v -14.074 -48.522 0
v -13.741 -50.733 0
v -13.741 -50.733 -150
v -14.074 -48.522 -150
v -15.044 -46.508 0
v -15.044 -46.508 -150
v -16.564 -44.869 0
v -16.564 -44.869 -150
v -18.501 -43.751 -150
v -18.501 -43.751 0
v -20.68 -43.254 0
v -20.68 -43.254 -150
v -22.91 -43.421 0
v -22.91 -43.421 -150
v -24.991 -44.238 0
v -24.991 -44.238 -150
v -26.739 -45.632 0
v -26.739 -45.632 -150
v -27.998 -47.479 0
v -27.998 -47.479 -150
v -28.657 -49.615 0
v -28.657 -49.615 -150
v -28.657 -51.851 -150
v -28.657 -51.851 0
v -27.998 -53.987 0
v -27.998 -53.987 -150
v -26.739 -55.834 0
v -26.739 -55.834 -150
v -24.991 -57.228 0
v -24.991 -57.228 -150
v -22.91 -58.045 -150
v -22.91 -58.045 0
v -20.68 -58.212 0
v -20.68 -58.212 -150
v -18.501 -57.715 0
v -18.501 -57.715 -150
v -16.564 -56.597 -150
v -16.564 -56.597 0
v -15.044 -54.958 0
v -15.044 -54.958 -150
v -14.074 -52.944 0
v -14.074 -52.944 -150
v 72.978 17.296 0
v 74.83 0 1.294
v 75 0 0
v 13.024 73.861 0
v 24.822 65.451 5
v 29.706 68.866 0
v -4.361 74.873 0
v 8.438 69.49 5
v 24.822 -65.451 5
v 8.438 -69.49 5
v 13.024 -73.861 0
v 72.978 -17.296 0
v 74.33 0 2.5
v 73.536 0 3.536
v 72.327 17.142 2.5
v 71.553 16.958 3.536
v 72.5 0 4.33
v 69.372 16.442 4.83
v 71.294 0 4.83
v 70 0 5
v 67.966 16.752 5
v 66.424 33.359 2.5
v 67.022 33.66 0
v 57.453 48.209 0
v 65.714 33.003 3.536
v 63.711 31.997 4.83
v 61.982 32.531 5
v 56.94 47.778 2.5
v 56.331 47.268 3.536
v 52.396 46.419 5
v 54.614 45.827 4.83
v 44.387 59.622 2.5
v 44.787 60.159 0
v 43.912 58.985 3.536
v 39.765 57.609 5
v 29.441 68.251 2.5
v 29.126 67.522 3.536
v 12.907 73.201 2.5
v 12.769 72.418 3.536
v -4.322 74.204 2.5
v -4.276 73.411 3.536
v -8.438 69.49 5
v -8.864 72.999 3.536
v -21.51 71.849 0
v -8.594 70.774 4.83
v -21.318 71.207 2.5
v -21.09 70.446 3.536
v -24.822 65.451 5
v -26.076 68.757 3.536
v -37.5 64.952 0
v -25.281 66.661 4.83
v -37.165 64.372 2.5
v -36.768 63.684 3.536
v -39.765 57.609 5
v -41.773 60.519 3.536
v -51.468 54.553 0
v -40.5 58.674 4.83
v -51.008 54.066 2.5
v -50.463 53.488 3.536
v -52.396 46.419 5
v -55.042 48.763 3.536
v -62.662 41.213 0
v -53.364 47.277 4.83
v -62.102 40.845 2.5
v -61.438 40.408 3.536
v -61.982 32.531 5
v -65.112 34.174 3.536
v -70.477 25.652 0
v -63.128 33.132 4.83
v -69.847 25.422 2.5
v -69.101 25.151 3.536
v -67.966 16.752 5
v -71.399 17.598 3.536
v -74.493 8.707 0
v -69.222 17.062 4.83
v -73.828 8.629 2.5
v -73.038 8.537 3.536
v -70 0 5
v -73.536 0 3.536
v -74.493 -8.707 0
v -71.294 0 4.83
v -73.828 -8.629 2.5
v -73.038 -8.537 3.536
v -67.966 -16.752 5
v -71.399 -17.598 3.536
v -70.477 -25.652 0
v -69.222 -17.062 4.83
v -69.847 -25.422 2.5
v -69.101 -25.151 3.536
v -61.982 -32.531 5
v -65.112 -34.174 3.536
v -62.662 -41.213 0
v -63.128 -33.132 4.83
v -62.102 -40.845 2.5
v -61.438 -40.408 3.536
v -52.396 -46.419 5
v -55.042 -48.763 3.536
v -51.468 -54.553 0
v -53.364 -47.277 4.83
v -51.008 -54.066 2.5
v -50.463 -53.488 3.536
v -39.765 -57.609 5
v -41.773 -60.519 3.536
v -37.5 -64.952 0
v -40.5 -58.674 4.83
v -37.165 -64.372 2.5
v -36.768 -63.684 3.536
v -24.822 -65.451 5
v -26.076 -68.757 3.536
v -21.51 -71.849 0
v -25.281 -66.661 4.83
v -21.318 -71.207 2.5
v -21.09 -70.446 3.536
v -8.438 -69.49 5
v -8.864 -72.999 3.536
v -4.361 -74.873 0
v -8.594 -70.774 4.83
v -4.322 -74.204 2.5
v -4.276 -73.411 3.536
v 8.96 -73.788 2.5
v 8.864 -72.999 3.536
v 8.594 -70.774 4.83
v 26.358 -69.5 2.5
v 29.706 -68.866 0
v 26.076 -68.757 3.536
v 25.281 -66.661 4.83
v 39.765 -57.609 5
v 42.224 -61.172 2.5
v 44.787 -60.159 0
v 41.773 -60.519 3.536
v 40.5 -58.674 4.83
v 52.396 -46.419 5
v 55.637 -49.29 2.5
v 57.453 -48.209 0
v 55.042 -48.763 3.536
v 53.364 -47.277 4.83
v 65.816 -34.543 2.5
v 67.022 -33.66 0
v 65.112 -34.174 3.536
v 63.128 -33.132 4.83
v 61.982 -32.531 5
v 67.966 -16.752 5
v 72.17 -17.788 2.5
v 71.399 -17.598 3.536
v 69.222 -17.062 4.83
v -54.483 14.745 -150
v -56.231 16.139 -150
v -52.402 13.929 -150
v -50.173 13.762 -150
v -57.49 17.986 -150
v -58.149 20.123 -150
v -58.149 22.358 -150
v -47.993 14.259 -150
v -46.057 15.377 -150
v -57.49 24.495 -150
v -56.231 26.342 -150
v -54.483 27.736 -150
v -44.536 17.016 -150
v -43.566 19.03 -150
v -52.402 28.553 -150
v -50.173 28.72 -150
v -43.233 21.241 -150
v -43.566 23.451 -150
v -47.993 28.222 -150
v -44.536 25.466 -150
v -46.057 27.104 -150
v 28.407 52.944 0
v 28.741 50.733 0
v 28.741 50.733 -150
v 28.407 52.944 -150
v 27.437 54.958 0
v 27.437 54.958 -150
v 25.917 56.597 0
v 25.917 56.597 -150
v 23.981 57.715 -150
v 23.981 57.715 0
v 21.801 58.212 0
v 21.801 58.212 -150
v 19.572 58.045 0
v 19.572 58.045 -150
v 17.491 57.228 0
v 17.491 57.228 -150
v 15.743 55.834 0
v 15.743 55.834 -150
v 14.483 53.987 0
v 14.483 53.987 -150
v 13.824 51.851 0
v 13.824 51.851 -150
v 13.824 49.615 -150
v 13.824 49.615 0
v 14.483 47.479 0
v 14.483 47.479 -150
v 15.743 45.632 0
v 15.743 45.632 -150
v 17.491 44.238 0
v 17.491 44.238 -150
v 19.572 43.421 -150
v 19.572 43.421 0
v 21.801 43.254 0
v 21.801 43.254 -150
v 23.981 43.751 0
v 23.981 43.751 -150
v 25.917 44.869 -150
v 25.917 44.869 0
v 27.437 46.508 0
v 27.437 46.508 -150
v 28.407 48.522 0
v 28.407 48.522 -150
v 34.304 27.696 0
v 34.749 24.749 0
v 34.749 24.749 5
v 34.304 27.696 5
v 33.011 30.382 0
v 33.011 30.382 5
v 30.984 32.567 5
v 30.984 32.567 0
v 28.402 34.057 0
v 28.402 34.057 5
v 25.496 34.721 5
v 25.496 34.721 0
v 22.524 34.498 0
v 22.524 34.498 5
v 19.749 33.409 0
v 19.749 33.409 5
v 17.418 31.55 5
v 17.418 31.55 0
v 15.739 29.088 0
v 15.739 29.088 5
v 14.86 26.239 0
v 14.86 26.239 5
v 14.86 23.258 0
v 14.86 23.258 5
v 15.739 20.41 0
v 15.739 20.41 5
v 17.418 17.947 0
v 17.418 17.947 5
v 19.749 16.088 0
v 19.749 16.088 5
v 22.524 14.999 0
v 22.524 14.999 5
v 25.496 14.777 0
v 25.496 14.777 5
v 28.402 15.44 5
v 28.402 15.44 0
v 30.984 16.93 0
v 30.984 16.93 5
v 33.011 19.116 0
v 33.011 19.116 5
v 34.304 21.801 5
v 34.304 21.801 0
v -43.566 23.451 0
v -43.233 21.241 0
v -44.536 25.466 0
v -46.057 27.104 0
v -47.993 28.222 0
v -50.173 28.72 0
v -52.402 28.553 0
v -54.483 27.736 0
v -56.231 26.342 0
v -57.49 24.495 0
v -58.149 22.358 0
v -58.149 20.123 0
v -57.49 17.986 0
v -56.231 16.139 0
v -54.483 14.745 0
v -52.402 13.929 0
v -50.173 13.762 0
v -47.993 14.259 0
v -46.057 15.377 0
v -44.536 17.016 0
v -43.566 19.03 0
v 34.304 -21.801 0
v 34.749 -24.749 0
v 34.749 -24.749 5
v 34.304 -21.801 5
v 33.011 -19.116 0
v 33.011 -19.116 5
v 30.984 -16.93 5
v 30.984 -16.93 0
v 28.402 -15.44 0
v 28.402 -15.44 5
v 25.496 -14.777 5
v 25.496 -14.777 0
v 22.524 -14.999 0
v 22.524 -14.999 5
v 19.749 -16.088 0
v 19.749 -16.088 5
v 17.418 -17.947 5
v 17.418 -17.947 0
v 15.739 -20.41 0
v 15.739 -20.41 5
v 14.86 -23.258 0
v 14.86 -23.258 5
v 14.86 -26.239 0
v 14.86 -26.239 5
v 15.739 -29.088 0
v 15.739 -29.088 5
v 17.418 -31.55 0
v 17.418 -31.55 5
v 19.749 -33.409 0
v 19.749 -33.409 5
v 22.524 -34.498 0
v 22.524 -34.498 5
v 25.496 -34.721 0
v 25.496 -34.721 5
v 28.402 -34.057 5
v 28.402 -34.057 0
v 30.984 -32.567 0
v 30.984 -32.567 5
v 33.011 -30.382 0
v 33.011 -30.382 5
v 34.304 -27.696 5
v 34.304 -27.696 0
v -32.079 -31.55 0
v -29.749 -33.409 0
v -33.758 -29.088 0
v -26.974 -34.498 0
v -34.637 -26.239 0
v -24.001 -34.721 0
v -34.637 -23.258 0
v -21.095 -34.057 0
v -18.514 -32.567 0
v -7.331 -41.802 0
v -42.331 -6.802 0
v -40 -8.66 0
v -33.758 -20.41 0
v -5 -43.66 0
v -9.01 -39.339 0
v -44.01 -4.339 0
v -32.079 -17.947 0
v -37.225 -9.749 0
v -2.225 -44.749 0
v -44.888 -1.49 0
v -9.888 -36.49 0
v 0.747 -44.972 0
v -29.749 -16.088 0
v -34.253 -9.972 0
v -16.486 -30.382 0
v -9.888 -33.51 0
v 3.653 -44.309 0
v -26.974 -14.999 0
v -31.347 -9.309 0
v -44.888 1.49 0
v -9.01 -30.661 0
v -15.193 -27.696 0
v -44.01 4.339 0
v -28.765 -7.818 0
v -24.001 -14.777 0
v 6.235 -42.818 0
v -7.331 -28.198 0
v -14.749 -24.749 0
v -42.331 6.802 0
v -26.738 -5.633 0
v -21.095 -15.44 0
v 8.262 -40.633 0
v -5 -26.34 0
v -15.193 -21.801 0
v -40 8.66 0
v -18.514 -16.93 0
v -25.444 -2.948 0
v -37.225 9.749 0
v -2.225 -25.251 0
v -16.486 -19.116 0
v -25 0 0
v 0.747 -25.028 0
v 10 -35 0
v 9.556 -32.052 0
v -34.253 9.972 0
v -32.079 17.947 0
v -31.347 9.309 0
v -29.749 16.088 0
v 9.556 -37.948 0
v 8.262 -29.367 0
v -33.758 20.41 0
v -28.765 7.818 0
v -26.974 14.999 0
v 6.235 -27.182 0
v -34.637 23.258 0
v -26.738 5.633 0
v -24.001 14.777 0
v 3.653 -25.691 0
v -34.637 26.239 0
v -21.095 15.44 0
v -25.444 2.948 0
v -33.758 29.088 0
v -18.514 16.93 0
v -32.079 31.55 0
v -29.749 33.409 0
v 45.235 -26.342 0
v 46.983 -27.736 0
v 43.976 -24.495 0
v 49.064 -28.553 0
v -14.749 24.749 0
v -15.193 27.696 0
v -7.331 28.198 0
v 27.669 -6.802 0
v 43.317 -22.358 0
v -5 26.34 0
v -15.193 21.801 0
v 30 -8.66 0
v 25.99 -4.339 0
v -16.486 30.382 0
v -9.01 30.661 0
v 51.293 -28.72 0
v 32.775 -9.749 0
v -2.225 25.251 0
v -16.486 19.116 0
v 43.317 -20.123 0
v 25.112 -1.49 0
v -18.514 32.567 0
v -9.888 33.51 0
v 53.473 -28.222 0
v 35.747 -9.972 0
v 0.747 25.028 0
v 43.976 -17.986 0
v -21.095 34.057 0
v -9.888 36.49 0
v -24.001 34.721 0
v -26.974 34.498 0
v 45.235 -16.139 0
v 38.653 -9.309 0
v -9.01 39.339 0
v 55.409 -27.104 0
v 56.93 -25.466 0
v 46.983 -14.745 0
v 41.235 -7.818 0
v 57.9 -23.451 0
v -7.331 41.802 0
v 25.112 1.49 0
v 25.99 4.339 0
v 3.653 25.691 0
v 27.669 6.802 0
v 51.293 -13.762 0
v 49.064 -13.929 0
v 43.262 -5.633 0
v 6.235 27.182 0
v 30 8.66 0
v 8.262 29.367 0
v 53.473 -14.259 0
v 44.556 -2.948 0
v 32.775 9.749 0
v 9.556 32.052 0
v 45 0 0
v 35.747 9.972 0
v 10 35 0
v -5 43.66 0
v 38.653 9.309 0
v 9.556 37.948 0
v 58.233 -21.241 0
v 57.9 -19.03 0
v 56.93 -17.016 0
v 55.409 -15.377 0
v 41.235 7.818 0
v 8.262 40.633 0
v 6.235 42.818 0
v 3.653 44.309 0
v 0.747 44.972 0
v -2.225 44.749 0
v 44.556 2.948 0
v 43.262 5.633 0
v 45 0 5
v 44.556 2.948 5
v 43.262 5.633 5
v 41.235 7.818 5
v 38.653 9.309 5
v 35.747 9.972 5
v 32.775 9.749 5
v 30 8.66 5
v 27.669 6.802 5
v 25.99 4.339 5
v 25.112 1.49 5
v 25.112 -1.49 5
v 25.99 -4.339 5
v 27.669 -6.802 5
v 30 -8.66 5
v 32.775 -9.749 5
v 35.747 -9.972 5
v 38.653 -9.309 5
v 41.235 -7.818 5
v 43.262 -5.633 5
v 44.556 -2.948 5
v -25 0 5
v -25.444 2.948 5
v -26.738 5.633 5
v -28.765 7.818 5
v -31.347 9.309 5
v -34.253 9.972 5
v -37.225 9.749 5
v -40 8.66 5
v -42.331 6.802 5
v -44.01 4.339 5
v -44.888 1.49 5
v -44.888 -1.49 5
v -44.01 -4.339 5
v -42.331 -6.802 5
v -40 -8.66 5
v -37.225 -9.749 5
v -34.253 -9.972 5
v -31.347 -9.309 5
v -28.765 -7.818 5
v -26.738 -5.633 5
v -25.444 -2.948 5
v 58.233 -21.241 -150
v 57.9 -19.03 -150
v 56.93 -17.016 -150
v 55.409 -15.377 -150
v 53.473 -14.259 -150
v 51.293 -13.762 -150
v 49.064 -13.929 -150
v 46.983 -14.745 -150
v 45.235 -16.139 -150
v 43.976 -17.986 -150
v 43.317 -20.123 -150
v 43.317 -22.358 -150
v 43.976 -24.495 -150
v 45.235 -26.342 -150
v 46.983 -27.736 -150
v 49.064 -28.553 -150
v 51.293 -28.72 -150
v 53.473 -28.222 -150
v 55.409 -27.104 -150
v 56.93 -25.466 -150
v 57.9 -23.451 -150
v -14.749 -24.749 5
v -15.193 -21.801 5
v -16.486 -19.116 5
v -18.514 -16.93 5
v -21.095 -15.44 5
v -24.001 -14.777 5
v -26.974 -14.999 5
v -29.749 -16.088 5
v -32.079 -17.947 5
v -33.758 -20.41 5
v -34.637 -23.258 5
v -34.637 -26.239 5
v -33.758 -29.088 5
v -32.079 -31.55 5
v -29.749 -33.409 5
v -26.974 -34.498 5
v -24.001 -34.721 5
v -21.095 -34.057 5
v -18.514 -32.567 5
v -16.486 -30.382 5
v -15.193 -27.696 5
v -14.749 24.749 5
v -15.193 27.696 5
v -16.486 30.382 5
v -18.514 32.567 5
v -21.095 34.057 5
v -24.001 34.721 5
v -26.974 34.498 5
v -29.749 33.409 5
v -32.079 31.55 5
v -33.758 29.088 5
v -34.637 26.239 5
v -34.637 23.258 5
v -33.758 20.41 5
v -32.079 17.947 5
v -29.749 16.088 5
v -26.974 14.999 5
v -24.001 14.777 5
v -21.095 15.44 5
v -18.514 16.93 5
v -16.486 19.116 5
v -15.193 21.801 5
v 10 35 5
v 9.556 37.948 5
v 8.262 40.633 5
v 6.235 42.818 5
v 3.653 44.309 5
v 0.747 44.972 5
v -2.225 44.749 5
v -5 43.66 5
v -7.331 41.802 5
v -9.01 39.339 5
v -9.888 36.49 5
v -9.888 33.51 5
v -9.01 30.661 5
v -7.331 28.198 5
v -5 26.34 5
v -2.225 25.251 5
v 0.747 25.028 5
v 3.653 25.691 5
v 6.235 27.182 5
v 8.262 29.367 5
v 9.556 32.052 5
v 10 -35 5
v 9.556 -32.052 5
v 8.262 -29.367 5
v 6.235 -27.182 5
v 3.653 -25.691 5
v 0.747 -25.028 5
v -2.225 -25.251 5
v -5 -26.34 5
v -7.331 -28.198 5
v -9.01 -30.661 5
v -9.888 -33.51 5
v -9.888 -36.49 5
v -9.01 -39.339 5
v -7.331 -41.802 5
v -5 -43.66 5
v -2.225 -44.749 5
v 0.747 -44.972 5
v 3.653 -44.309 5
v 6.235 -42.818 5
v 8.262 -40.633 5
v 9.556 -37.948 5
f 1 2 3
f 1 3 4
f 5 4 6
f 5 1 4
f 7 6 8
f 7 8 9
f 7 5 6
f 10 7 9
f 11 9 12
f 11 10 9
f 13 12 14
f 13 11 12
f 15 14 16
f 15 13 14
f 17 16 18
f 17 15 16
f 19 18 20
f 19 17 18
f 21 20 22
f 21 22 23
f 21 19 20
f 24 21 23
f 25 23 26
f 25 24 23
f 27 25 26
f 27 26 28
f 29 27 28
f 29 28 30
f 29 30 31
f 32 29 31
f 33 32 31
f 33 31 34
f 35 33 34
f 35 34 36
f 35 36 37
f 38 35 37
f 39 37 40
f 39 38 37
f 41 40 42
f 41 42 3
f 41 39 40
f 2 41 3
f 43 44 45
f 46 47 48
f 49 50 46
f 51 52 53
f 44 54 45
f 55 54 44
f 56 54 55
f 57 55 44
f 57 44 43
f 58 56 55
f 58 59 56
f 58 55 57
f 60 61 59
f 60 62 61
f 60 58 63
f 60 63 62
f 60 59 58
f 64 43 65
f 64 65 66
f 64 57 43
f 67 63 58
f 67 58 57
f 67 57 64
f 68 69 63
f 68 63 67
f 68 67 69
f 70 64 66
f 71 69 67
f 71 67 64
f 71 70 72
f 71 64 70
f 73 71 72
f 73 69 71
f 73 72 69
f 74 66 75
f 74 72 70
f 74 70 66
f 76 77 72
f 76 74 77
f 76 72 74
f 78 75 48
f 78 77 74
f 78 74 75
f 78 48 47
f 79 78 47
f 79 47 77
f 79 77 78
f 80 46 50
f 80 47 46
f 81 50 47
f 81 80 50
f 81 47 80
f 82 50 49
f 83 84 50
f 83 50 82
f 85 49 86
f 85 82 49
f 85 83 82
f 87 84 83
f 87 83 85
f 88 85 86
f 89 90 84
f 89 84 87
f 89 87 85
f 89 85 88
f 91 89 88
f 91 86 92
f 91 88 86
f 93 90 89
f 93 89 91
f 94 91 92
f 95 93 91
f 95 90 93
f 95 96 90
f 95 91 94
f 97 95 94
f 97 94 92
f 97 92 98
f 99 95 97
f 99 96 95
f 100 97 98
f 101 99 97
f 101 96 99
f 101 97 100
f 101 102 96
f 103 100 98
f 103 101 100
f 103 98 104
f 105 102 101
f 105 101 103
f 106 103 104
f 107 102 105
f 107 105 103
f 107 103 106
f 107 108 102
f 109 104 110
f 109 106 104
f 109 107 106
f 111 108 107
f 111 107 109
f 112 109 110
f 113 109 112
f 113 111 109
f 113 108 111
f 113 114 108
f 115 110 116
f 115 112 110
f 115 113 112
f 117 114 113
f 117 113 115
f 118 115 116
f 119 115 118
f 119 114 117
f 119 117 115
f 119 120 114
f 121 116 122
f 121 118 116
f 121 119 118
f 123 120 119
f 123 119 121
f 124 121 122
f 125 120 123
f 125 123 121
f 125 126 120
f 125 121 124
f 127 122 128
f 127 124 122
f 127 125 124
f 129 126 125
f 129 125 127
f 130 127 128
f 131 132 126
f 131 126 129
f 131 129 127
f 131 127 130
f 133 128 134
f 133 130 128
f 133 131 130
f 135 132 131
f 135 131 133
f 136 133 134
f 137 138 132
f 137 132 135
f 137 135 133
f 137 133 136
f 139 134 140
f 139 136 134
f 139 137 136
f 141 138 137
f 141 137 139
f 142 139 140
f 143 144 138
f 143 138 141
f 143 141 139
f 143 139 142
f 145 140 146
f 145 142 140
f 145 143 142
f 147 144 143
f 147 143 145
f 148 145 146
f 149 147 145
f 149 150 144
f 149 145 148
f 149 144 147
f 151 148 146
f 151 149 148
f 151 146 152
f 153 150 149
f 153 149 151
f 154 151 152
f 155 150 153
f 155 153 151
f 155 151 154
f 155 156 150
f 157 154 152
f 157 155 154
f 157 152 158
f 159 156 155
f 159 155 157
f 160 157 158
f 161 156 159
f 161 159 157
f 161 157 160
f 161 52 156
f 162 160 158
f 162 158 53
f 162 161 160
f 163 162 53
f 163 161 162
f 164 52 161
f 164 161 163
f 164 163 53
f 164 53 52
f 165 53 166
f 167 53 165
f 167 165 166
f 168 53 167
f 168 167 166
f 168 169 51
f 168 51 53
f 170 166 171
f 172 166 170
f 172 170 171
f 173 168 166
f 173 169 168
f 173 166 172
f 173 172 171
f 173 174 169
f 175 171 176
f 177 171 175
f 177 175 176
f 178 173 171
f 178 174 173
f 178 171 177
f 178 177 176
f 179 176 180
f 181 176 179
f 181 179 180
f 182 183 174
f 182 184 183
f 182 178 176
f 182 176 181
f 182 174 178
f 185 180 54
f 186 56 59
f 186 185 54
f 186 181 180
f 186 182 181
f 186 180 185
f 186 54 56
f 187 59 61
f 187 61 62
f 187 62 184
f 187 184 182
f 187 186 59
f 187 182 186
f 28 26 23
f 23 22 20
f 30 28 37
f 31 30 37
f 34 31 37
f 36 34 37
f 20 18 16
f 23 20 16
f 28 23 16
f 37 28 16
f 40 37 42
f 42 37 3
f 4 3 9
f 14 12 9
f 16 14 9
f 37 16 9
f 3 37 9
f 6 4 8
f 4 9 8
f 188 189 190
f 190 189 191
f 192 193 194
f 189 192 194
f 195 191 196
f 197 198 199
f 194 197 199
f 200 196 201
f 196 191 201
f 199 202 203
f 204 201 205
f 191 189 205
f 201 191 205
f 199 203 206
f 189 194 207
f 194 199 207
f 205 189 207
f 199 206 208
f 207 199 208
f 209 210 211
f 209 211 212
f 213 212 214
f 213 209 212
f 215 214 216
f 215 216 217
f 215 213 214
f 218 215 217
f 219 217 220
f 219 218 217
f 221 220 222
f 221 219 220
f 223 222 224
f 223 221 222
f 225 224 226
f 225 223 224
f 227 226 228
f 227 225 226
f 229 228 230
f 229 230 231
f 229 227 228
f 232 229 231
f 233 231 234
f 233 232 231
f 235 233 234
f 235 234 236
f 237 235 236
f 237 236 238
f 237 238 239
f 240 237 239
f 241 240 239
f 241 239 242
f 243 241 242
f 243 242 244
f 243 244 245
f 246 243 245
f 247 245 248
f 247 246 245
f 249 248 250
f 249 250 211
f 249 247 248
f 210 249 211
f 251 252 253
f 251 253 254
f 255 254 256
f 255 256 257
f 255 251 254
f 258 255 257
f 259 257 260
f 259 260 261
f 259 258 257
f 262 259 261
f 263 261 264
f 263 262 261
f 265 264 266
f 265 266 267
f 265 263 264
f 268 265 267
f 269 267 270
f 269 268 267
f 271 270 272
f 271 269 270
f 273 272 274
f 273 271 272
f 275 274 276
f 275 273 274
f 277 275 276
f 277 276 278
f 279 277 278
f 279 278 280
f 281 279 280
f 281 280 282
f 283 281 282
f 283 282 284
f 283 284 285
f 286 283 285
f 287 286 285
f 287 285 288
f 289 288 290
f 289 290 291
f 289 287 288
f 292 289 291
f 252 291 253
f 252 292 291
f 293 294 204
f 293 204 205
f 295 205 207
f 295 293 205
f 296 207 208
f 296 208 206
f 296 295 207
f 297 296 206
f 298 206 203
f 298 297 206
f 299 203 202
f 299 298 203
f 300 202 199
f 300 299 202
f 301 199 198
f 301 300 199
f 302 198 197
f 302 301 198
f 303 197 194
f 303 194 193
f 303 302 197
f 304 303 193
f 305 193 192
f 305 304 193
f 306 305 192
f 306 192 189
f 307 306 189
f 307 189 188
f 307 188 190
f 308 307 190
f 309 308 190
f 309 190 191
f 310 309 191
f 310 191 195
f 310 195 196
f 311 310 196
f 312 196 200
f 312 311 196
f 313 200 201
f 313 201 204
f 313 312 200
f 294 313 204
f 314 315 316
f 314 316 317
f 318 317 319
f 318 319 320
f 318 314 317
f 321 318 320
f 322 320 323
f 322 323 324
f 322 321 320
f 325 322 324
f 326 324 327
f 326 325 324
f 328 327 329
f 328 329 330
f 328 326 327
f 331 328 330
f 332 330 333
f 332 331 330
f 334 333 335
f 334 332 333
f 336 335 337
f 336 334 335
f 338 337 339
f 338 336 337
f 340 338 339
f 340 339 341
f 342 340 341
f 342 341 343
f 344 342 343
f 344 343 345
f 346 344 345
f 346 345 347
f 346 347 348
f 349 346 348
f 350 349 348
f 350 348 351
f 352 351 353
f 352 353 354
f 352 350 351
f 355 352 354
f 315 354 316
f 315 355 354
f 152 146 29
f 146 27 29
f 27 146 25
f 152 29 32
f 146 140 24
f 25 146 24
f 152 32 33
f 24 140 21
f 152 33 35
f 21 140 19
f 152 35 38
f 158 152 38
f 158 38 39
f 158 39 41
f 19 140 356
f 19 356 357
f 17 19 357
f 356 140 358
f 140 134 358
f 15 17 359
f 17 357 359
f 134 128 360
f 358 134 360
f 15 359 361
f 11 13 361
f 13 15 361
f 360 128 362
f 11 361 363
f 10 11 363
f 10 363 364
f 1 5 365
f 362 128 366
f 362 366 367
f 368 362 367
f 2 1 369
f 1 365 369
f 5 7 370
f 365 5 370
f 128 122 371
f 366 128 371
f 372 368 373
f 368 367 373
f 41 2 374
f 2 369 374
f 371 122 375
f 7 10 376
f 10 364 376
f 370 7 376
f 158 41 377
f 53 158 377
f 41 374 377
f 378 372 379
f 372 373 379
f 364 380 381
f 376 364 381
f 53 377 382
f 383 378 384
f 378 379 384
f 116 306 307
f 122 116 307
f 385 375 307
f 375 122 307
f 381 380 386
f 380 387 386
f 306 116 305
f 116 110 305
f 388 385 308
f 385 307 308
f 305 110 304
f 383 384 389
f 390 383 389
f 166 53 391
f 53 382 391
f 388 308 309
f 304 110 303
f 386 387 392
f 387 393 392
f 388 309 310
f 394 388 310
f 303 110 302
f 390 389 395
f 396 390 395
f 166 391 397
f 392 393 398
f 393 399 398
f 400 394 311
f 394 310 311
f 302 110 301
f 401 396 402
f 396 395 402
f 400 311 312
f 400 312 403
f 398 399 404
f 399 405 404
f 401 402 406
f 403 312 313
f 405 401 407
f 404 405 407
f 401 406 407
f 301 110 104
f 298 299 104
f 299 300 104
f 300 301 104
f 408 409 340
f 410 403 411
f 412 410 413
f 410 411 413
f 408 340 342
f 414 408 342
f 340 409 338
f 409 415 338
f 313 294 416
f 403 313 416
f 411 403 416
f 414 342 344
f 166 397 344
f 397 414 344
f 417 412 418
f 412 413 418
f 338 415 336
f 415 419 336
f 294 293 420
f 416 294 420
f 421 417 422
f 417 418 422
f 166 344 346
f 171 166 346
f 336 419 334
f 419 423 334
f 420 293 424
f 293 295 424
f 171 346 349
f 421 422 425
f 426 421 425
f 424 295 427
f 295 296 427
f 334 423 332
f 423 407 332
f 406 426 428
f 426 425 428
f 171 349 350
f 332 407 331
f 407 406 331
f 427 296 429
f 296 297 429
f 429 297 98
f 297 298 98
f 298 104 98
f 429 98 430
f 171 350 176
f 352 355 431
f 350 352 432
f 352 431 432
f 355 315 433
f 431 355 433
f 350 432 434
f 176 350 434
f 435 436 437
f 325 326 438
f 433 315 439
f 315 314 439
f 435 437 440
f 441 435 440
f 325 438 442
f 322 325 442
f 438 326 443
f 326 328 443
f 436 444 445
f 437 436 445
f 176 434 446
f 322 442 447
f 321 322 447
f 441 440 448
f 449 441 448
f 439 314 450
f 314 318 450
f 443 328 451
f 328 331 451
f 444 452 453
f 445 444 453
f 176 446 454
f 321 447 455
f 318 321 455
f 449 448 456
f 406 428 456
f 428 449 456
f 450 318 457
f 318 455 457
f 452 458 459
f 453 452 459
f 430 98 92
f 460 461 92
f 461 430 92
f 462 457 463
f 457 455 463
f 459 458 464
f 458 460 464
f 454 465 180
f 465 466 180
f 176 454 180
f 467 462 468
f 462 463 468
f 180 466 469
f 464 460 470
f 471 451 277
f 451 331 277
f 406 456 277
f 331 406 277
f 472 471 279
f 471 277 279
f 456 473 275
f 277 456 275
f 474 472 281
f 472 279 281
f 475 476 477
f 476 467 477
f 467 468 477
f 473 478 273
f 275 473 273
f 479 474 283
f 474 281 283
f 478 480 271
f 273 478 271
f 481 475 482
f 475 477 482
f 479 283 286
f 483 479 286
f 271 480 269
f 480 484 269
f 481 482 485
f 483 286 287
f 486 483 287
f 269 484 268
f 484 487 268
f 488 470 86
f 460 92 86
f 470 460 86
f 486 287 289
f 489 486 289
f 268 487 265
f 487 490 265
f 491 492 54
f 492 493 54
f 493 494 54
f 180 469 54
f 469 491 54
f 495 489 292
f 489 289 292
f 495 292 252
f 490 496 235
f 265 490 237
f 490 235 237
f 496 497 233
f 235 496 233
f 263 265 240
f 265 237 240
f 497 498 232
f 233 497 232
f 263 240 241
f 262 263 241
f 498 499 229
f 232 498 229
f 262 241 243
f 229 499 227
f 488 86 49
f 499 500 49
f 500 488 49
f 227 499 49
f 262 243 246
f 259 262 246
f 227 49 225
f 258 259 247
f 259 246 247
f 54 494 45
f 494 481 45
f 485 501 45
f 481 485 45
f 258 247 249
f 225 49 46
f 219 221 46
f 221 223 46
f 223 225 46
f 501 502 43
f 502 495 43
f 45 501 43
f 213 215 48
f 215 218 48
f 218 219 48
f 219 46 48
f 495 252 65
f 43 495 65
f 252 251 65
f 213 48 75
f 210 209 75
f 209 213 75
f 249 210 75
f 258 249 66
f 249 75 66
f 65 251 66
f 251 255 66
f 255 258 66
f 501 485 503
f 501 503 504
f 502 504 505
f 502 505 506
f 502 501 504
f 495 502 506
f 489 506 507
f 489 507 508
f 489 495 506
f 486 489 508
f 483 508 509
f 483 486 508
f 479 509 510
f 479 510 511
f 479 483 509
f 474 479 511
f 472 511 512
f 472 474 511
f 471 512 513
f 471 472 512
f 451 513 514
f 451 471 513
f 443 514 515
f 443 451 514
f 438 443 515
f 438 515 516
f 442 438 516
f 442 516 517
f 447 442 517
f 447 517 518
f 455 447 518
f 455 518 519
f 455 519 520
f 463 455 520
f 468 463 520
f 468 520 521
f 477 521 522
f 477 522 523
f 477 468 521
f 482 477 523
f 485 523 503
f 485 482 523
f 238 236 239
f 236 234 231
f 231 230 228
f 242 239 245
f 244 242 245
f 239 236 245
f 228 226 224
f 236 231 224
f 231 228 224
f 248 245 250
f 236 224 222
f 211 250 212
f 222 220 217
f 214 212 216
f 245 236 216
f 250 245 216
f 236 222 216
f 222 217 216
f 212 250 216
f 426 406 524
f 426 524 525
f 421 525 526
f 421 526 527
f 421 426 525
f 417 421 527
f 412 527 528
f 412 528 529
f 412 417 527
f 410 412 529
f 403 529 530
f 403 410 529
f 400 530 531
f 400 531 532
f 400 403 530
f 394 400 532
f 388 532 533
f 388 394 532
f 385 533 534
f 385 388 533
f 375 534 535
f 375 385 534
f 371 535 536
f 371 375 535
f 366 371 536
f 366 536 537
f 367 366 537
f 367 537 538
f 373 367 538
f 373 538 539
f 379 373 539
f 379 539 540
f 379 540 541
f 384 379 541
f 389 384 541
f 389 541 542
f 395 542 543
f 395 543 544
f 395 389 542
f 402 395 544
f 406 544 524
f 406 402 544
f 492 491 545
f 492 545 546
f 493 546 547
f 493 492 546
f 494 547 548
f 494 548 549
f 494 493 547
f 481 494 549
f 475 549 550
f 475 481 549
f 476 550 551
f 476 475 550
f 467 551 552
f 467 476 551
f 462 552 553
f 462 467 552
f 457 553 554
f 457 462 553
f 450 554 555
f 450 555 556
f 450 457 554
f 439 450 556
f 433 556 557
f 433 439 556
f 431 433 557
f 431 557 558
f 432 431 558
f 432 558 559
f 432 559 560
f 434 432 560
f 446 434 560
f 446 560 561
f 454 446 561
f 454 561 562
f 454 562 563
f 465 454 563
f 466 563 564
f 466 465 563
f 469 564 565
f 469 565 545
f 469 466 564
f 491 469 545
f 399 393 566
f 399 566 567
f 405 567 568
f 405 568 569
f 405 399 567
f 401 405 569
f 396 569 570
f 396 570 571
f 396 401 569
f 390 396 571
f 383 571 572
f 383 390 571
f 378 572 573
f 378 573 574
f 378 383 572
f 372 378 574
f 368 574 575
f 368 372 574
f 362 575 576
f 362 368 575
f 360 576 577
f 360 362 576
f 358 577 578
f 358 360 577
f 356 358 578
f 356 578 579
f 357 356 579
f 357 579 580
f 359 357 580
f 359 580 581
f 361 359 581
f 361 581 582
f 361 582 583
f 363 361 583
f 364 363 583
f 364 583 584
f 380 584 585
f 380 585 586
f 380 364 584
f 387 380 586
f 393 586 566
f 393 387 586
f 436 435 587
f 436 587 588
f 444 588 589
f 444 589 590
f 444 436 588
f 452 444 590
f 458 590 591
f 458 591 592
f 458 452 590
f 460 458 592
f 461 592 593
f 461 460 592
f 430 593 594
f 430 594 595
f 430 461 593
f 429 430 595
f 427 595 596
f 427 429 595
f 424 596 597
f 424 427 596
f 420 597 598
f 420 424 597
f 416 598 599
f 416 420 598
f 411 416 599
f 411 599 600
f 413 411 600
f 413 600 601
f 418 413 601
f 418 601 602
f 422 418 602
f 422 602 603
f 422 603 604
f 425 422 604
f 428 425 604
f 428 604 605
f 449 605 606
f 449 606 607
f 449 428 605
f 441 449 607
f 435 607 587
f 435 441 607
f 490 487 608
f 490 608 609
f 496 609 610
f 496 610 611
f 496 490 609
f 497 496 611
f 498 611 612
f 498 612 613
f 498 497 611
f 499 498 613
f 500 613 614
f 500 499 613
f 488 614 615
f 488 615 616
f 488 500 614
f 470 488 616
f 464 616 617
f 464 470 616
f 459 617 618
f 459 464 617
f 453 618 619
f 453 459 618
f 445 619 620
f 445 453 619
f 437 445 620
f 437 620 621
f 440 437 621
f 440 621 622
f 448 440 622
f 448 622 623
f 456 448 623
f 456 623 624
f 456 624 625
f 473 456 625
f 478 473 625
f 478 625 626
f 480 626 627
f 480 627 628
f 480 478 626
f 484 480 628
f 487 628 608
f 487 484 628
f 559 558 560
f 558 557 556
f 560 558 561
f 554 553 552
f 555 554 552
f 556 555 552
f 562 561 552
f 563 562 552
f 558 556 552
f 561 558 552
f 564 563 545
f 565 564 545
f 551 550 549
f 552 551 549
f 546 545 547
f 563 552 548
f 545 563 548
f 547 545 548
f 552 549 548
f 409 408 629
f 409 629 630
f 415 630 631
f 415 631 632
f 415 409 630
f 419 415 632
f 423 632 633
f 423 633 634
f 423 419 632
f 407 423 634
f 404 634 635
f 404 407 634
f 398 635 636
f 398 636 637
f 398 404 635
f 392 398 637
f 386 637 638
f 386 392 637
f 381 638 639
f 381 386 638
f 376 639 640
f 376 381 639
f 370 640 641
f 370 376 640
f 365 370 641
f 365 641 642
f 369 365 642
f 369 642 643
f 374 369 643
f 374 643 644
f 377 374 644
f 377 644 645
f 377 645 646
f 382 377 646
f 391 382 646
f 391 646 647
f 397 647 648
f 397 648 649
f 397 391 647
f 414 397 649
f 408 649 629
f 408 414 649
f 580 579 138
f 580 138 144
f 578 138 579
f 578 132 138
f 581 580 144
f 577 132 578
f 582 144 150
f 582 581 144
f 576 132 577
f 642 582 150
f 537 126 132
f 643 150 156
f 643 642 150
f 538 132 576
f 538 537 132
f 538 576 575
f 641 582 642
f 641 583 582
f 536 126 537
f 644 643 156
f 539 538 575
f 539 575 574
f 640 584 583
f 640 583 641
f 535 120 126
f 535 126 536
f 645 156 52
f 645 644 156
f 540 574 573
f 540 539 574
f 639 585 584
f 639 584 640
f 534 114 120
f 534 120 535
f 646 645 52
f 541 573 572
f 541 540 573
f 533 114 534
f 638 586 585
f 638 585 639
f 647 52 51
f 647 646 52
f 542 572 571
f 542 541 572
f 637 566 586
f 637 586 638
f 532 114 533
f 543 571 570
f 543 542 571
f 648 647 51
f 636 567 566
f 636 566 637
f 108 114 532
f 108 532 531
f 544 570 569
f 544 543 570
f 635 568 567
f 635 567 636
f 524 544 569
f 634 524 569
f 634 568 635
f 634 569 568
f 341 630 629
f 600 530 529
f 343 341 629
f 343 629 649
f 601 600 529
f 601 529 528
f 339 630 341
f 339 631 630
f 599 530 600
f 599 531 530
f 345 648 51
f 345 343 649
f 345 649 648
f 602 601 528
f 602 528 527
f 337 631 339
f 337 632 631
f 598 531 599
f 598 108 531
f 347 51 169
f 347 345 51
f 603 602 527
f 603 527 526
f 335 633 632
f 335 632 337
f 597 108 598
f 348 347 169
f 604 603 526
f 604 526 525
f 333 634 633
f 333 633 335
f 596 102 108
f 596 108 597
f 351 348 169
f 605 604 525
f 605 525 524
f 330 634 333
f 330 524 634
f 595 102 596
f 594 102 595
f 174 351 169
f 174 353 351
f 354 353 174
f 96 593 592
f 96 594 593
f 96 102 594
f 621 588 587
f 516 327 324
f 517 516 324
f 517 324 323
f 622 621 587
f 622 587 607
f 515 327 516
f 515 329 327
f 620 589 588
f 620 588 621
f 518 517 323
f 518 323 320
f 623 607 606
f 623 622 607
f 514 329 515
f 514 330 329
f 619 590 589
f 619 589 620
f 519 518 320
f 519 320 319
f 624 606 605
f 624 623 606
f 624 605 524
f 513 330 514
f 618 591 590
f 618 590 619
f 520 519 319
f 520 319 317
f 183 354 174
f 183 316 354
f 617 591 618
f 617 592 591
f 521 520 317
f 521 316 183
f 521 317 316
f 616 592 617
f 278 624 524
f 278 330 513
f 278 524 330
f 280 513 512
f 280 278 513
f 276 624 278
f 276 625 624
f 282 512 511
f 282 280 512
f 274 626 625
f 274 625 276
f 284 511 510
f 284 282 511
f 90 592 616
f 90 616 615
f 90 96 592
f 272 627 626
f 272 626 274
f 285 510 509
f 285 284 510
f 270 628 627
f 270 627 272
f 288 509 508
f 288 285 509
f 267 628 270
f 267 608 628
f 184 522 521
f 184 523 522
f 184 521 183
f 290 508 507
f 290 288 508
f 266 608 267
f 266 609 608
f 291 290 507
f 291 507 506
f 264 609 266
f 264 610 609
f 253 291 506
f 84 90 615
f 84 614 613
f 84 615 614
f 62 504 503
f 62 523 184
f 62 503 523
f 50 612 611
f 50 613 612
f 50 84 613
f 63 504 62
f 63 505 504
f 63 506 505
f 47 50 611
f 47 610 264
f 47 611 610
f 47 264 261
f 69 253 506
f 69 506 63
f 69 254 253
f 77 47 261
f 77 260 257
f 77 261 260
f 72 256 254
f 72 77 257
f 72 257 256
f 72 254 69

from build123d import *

# Parameters (mm, degrees)
F0_R     = 75
F0_R_2   = 10
F1_DEPTH = 5
F2_R     = 4.99999
F3_R     = 7.5
F4_DEPTH = 150


# Not quite as in the source:
# - a fillet or chamfer is up to 0.001 mm smaller than in the source, because OpenCascade refuses the exact size


with BuildPart() as f1:
    # F0 (on Top) → F1 (new body)
    with BuildSketch(Plane.XY):
        Circle(F0_R)
        with Locations((-24.7487373415, -24.7487373415)):
            Circle(F0_R_2, mode=Mode.SUBTRACT)
        with Locations((0, -35)):
            Circle(F0_R_2, mode=Mode.SUBTRACT)
        with Locations((24.7487373415, -24.7487373415)):
            Circle(F0_R_2, mode=Mode.SUBTRACT)
        with Locations((-35, 0)):
            Circle(F0_R_2, mode=Mode.SUBTRACT)
        with Locations((-24.7487373415, 24.7487373415)):
            Circle(F0_R_2, mode=Mode.SUBTRACT)
        with Locations((35, 0)):
            Circle(F0_R_2, mode=Mode.SUBTRACT)
        with Locations((0, 35)):
            Circle(F0_R_2, mode=Mode.SUBTRACT)
        with Locations((24.7487373415, 24.7487373415)):
            Circle(F0_R_2, mode=Mode.SUBTRACT)
    extrude(amount=F1_DEPTH)

    # F2 (radius 5 in the source; OpenCascade refuses exactly that, so slightly less here)
    f2_edges = [f1.edges().sort_by_distance(p)[0] for p in [
        (-75, 0, 5),
    ]]
    fillet(f2_edges, radius=F2_R)

    # F3 (on face) → F4 (join)
    with BuildSketch(Plane.XY):
        with Locations((21.2406198754, 50.7329879596)):
            Circle(F3_R)
        with Locations((-50.7329879596, 21.2406198754)):
            Circle(F3_R)
        with Locations((-21.2406198754, -50.7329879596)):
            Circle(F3_R)
        with Locations((50.7329879596, -21.2406198754)):
            Circle(F3_R)
    extrude(amount=-F4_DEPTH)


solid = f1.part
